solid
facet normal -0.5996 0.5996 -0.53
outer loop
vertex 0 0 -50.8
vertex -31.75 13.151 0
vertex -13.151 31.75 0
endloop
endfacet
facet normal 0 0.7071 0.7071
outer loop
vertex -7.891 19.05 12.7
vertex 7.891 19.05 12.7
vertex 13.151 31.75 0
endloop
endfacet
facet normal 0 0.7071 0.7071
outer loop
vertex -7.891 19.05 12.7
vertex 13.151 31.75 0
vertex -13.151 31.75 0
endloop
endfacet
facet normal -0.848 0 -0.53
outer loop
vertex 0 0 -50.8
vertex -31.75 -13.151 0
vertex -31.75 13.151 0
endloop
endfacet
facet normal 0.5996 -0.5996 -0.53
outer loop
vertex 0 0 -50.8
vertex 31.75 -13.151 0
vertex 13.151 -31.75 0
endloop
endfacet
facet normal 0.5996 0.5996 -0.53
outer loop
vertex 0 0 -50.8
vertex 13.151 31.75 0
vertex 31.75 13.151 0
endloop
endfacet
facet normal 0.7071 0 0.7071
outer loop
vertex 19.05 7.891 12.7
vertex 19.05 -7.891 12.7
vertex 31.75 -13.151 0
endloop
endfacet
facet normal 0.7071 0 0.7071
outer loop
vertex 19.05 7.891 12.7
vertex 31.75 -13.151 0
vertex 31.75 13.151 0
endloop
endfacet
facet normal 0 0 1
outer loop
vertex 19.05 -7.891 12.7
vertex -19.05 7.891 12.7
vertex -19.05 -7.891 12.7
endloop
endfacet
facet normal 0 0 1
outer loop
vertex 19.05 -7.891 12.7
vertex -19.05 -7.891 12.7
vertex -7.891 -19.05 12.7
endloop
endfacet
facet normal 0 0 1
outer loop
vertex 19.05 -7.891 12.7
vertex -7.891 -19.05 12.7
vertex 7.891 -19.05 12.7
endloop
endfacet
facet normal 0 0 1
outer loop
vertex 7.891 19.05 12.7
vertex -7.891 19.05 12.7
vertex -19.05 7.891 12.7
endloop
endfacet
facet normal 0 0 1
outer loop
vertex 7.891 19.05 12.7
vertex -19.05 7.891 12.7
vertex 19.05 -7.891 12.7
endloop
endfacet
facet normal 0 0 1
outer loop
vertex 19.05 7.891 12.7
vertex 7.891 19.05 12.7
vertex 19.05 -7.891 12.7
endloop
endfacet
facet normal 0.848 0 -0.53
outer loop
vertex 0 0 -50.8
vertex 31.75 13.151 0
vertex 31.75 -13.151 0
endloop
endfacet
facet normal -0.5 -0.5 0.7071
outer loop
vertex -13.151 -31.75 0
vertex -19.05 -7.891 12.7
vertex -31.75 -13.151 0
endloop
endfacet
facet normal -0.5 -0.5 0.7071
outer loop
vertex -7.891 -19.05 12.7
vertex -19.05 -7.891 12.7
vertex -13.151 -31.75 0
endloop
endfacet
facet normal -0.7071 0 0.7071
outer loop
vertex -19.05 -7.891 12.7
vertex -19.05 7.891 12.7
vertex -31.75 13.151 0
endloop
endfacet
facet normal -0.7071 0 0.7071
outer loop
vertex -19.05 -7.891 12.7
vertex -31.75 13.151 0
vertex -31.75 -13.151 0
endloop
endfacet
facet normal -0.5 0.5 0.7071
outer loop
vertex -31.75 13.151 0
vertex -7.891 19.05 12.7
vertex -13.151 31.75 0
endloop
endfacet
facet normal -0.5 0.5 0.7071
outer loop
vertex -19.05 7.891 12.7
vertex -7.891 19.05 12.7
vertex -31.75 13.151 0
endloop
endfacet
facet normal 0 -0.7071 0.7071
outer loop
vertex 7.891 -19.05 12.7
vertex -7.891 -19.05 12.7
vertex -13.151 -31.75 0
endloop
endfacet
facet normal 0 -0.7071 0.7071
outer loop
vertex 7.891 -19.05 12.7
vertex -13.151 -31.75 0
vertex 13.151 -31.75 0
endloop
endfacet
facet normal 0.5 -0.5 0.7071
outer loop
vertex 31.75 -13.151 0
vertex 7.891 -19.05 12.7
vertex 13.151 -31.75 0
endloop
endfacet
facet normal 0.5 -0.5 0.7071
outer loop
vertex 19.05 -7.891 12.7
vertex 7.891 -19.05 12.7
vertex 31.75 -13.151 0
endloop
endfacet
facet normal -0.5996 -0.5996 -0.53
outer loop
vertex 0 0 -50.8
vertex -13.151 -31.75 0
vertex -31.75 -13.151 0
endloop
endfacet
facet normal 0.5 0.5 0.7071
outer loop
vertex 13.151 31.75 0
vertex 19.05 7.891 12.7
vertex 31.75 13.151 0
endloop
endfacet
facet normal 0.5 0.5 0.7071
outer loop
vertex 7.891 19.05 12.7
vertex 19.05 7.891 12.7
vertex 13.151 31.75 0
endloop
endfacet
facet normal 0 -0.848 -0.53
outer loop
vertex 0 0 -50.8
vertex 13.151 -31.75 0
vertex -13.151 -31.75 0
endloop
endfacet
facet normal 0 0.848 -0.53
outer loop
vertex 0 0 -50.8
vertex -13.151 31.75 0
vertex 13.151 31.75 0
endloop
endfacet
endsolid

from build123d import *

# Parameters (mm, degrees)
F1_DEPTH = 12.7
F2_SIZE2 = 12.69999
F2_SIZE  = 12.69999


# Not quite as in the source:
# - a fillet or chamfer is up to 0.001 mm smaller than in the source, because OpenCascade refuses the exact size


with BuildPart() as f1:
    # F0 (on Top) → F1 (new body)
    with BuildSketch(Plane.XY):
        Polygon((-31.75, 13.1512806053), (-31.75, -13.1512806053), (-13.1512806053, -31.75), (13.1512806053, -31.75), (31.75, -13.1512806053), (31.75, 13.1512806053), (13.1512806053, 31.75), (-13.1512806053, 31.75), align=None)
    extrude(amount=F1_DEPTH)

    # F2 (size 12.7 and 12.7 in the source; OpenCascade refuses exactly that, so slightly less here)
    f2_edges = [f1.edges().sort_by_distance(p)[0] for p in [
        (-22.45064, 22.45064, 12.7),
        (-31.75, 0, 12.7),
        (-22.45064, -22.45064, 12.7),
        (0, -31.75, 12.7),
        (22.45064, -22.45064, 12.7),
        (31.75, 0, 12.7),
        (22.45064, 22.45064, 12.7),
        (0, 31.75, 12.7),
    ]]
    chamfer(f2_edges, length=F2_SIZE, length2=F2_SIZE2)

    # F1_face (on face) → F5 section 0
    with BuildSketch(Plane(origin=(0, 0, 0), x_dir=(1, 0, 0), z_dir=(0, 0, -1)), mode=Mode.PRIVATE) as f5_s0:
        Polygon((-31.75, -13.1512806053), (-13.1512806053, -31.75), (13.1512806053, -31.75), (31.75, -13.1512806053), (31.75, 13.1512806053), (13.1512806053, 31.75), (-13.1512806053, 31.75), (-31.75, 13.1512806053), align=None)
    loft([f5_s0.sketch, Vertex(0, 0, -50.8)])


solid = f1.part
